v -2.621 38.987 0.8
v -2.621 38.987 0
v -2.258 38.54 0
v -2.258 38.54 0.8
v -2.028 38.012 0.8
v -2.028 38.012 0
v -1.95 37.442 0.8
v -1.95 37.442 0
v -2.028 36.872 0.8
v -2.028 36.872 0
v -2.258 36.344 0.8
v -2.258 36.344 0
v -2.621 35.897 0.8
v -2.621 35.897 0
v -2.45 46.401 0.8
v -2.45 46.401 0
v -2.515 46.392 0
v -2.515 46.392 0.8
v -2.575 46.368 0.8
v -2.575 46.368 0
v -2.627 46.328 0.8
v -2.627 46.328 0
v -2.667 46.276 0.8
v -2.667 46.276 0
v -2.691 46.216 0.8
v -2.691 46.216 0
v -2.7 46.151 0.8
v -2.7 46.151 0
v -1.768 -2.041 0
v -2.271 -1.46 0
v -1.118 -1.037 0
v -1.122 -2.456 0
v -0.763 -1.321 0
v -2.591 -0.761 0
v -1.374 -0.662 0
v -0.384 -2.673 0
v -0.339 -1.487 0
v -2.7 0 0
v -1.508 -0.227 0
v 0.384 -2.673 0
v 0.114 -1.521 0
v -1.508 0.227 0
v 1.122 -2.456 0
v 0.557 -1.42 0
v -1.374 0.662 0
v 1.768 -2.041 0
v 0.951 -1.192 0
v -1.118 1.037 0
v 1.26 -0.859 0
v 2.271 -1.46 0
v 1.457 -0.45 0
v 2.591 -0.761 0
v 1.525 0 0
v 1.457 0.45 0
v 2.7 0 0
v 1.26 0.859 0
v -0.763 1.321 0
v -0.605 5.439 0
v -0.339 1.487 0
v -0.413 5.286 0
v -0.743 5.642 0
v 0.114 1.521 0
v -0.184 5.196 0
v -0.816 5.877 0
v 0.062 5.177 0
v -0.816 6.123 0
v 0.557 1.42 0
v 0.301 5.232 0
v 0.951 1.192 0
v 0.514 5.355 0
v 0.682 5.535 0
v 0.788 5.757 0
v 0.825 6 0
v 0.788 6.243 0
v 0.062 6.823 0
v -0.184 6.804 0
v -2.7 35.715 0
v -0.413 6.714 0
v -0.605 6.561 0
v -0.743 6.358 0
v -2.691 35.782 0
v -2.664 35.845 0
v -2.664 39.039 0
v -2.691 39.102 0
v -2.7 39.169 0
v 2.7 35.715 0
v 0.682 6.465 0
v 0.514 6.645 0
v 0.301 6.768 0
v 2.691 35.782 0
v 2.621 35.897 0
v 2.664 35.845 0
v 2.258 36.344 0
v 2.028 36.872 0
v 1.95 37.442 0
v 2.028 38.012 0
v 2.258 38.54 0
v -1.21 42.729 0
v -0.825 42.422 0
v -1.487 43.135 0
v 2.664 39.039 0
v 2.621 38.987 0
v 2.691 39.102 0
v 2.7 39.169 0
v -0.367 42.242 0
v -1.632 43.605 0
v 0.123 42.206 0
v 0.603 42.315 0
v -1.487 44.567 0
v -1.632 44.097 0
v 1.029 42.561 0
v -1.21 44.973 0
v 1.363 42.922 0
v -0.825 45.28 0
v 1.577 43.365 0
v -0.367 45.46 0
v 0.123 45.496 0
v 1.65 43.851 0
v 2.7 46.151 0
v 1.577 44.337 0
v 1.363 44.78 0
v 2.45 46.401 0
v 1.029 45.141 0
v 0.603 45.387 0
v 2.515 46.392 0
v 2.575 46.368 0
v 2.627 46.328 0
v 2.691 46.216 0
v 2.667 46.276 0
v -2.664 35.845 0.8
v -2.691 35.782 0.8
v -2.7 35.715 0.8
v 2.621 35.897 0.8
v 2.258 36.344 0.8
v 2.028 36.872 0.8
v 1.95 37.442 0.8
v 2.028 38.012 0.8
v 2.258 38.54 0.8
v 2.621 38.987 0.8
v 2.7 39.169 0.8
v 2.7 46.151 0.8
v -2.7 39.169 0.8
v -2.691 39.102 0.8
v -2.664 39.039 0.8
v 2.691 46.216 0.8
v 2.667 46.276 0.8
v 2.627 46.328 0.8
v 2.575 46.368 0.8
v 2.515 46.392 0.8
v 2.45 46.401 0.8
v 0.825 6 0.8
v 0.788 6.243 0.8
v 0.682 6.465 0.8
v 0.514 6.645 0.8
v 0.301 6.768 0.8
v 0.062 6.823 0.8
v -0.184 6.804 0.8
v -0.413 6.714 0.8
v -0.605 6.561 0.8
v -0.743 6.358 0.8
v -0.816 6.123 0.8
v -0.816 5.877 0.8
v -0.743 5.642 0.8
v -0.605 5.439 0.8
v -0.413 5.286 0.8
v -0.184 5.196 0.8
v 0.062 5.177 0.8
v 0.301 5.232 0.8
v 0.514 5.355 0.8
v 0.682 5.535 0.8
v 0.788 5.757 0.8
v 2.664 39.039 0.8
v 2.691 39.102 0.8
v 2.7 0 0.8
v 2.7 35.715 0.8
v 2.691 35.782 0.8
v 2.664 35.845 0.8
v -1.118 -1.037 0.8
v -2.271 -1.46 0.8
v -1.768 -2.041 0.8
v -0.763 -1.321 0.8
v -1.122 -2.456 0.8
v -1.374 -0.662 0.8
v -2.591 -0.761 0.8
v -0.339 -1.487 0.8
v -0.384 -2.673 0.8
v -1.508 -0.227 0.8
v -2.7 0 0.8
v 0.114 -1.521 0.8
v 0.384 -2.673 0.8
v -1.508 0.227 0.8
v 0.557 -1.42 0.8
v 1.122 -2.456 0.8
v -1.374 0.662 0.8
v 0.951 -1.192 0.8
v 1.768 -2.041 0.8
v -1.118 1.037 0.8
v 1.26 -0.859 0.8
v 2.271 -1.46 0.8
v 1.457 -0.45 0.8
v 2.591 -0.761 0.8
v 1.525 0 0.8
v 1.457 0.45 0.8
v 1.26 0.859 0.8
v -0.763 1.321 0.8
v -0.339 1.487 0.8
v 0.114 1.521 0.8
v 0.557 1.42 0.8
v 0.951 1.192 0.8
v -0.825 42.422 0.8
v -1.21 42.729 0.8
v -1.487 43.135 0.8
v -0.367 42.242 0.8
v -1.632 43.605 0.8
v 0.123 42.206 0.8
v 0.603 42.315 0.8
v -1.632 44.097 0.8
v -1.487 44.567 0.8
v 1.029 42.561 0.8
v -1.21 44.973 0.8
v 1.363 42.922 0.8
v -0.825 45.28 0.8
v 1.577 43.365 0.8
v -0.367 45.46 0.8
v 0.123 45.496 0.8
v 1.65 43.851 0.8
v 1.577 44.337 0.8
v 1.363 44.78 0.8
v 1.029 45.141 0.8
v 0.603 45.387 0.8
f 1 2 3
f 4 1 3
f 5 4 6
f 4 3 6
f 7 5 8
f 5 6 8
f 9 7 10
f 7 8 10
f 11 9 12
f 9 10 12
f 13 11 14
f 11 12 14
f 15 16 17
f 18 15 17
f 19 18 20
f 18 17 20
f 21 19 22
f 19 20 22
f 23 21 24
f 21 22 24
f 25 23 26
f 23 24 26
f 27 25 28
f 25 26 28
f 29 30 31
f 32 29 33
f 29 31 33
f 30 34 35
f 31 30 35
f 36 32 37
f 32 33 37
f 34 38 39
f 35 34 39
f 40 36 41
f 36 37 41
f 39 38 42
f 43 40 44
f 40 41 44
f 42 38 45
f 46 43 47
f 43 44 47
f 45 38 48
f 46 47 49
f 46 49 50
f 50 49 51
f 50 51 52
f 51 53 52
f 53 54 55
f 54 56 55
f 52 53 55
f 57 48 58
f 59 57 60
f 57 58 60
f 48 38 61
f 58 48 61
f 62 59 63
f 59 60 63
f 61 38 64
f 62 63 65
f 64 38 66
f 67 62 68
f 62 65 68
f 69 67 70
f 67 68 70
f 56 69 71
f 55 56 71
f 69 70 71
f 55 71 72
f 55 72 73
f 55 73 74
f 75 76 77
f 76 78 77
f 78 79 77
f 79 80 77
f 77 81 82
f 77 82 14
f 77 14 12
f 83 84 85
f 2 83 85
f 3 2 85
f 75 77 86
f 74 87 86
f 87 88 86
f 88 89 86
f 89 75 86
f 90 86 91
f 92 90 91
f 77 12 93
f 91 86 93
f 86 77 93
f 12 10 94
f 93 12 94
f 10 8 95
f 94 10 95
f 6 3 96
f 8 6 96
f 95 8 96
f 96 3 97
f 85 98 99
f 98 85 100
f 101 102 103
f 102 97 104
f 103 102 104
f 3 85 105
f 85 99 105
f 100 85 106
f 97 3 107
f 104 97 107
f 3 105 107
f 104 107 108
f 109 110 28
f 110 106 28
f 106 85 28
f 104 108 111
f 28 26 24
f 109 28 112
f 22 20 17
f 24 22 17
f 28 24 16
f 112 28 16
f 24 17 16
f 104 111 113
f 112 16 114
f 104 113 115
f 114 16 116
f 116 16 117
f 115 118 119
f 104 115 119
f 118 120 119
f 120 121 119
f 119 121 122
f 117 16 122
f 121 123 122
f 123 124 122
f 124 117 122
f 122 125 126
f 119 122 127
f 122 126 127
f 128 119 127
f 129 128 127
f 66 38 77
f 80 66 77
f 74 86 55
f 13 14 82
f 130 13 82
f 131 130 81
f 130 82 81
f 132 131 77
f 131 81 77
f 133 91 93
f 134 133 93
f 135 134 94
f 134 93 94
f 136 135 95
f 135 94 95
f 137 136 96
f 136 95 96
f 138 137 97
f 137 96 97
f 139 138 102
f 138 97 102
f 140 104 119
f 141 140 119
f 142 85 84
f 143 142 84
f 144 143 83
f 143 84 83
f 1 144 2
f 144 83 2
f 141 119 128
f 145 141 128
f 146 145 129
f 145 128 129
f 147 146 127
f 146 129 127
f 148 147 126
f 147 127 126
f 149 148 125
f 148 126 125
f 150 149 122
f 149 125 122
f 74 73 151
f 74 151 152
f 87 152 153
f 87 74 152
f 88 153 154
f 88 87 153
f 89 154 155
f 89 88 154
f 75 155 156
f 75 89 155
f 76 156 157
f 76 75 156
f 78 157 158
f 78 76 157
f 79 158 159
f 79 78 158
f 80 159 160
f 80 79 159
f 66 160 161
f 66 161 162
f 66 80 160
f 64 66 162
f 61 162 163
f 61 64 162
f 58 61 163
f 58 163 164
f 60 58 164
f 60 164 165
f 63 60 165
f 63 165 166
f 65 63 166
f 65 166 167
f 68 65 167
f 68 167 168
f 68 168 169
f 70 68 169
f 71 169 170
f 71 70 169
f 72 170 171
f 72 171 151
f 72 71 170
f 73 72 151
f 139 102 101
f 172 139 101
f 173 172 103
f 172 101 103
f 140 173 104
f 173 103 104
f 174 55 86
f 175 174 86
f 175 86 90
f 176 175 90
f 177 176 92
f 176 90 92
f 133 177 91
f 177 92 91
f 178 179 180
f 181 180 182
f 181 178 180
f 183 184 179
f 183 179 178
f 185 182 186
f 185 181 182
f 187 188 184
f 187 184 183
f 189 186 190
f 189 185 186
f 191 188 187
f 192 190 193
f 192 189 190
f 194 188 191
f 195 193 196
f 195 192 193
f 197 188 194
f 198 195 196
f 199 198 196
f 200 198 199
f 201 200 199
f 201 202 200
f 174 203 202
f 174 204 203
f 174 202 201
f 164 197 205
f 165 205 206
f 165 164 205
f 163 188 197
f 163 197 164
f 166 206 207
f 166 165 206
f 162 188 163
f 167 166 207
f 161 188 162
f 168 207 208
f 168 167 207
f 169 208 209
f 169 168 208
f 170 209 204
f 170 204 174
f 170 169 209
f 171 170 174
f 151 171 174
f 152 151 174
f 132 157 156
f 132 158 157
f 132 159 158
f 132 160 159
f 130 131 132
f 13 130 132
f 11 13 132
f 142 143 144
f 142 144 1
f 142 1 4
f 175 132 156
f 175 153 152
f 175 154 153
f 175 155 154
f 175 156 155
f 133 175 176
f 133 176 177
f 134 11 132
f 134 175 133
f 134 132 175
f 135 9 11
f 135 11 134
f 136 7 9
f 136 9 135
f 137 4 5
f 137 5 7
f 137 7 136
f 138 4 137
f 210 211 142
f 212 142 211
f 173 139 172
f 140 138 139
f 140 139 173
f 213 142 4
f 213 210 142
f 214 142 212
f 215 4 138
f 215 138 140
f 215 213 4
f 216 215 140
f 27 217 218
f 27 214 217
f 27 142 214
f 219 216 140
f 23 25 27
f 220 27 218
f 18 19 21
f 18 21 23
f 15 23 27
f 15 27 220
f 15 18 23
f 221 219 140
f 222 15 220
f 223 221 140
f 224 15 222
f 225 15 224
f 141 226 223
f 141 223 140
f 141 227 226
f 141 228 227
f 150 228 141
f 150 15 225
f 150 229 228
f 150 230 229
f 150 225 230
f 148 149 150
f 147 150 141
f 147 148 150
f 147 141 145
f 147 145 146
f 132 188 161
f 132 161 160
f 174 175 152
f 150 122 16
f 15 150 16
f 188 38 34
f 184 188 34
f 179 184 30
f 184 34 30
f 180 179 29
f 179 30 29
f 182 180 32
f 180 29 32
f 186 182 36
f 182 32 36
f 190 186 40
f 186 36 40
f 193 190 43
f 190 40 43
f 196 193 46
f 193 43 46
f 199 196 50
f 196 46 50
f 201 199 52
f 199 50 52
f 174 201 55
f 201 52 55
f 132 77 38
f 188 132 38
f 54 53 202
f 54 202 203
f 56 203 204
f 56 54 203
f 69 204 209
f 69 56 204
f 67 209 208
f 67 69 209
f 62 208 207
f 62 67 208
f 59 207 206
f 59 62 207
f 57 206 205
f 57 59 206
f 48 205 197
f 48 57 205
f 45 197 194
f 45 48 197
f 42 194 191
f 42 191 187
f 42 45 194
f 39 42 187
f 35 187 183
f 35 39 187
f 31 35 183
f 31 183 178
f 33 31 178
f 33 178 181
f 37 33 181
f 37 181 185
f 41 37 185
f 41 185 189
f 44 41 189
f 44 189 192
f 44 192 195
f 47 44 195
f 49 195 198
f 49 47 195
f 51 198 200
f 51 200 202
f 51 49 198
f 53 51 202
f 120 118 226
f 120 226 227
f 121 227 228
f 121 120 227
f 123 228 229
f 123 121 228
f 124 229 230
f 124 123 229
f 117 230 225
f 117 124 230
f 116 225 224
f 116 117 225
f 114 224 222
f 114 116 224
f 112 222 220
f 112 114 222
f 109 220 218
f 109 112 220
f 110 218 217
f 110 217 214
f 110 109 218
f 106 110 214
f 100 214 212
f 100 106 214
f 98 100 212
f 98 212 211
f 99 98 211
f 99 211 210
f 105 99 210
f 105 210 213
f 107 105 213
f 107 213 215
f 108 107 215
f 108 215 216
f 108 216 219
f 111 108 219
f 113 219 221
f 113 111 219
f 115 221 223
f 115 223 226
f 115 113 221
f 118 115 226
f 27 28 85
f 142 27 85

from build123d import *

# Parameters (mm, degrees)
SKETCH_2_R      = 1.525
SKETCH_2_R_2    = 0.825
SKETCH_2_R_3    = 1.65
EXTRUDE_1_DEPTH = 0.8


with BuildPart() as part:
    # 草图2 → 凸台-拉伸1 (new body)
    with BuildSketch(Plane.XY):
        with BuildLine():
            Line((2.45, 46.401), (-2.45, 46.401))
            ThreePointArc((-2.45, 46.401), (-2.626776695, 46.327776695), (-2.7, 46.151))
            Line((-2.7, 46.151), (-2.7, 39.169281101))
            ThreePointArc((-2.7, 39.169281101), (-2.679315634, 39.069710321), (-2.620685279, 38.98661601))
            ThreePointArc((-2.620685279, 38.98661601), (-1.95, 37.442), (-2.620685279, 35.897383991))
            ThreePointArc((-2.620685279, 35.897383991), (-2.679315634, 35.814289679), (-2.7, 35.7147189))
            Line((-2.7, 35.7147189), (-2.7, 0))
            ThreePointArc((-2.7, 0), (0, -2.7), (2.7, 0))
            Line((2.7, 0), (2.7, 35.7147189))
            ThreePointArc((2.7, 35.7147189), (2.679315634, 35.814289679), (2.620685279, 35.897383991))
            ThreePointArc((2.620685279, 35.897383991), (1.95, 37.442), (2.620685279, 38.98661601))
            ThreePointArc((2.620685279, 38.98661601), (2.679315634, 39.069710321), (2.7, 39.169281101))
            Line((2.7, 39.169281101), (2.7, 46.151))
            ThreePointArc((2.7, 46.151), (2.626776695, 46.327776695), (2.45, 46.401))
        make_face()
        Circle(SKETCH_2_R, mode=Mode.SUBTRACT)
        with Locations((0, 6)):
            Circle(SKETCH_2_R_2, mode=Mode.SUBTRACT)
        with Locations((0, 43.851)):
            Circle(SKETCH_2_R_3, mode=Mode.SUBTRACT)
    extrude(amount=EXTRUDE_1_DEPTH)


solid = part.part
